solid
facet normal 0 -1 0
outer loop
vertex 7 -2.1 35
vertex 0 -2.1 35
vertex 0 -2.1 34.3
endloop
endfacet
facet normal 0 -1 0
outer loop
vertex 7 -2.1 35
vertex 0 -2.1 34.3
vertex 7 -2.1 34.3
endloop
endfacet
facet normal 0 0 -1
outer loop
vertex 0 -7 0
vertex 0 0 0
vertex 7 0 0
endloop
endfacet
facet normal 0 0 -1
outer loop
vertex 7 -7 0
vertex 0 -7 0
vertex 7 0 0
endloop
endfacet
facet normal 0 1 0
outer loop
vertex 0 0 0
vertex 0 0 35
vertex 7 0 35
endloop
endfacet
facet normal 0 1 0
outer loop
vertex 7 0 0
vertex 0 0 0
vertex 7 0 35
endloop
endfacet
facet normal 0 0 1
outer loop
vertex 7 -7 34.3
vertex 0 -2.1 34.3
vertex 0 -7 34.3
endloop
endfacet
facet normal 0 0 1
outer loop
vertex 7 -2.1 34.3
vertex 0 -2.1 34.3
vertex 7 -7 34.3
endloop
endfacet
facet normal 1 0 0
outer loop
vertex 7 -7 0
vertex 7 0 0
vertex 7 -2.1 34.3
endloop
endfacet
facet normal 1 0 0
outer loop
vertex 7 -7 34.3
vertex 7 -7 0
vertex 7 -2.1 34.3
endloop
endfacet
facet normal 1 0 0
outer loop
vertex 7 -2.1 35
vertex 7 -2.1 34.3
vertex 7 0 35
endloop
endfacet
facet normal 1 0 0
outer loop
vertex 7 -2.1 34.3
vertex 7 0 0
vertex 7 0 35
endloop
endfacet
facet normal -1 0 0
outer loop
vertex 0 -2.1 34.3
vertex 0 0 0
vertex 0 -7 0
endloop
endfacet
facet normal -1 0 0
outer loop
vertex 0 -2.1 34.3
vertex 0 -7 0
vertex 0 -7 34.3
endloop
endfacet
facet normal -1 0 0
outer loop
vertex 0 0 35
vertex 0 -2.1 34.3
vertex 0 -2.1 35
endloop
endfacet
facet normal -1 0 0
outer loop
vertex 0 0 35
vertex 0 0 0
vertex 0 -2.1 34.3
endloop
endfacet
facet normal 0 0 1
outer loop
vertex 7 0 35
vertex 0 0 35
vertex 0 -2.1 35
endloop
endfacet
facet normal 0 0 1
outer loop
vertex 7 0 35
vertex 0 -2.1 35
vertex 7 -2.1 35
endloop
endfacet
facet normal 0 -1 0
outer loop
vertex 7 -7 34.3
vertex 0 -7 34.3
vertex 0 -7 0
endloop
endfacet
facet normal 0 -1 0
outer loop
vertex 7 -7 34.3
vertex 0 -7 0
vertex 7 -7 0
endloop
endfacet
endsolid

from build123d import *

# Parameters (mm, degrees)
F0_W     = 100
F0_H     = 500
F1_DEPTH = 100
F2_W     = 100
F2_H     = 70
F3_DEPTH = 10
F4_SCALE = 0.07


with BuildPart() as f1:
    # F0 (on Front) → F1 (new body)
    with BuildSketch(Plane.XZ):
        with Locations((50, 250)):
            Rectangle(F0_W, F0_H)
    extrude(amount=F1_DEPTH)

    # F2 (on face) → F3 (cut)
    with BuildSketch(Plane.XY.offset(500)):
        with Locations((50, -65)):
            Rectangle(F2_W, F2_H)
    extrude(amount=-F3_DEPTH, mode=Mode.SUBTRACT)


with BuildPart() as f1_1:
    # F4: moved
    add(f1.part.scale(F4_SCALE))


solid = f1_1.part
